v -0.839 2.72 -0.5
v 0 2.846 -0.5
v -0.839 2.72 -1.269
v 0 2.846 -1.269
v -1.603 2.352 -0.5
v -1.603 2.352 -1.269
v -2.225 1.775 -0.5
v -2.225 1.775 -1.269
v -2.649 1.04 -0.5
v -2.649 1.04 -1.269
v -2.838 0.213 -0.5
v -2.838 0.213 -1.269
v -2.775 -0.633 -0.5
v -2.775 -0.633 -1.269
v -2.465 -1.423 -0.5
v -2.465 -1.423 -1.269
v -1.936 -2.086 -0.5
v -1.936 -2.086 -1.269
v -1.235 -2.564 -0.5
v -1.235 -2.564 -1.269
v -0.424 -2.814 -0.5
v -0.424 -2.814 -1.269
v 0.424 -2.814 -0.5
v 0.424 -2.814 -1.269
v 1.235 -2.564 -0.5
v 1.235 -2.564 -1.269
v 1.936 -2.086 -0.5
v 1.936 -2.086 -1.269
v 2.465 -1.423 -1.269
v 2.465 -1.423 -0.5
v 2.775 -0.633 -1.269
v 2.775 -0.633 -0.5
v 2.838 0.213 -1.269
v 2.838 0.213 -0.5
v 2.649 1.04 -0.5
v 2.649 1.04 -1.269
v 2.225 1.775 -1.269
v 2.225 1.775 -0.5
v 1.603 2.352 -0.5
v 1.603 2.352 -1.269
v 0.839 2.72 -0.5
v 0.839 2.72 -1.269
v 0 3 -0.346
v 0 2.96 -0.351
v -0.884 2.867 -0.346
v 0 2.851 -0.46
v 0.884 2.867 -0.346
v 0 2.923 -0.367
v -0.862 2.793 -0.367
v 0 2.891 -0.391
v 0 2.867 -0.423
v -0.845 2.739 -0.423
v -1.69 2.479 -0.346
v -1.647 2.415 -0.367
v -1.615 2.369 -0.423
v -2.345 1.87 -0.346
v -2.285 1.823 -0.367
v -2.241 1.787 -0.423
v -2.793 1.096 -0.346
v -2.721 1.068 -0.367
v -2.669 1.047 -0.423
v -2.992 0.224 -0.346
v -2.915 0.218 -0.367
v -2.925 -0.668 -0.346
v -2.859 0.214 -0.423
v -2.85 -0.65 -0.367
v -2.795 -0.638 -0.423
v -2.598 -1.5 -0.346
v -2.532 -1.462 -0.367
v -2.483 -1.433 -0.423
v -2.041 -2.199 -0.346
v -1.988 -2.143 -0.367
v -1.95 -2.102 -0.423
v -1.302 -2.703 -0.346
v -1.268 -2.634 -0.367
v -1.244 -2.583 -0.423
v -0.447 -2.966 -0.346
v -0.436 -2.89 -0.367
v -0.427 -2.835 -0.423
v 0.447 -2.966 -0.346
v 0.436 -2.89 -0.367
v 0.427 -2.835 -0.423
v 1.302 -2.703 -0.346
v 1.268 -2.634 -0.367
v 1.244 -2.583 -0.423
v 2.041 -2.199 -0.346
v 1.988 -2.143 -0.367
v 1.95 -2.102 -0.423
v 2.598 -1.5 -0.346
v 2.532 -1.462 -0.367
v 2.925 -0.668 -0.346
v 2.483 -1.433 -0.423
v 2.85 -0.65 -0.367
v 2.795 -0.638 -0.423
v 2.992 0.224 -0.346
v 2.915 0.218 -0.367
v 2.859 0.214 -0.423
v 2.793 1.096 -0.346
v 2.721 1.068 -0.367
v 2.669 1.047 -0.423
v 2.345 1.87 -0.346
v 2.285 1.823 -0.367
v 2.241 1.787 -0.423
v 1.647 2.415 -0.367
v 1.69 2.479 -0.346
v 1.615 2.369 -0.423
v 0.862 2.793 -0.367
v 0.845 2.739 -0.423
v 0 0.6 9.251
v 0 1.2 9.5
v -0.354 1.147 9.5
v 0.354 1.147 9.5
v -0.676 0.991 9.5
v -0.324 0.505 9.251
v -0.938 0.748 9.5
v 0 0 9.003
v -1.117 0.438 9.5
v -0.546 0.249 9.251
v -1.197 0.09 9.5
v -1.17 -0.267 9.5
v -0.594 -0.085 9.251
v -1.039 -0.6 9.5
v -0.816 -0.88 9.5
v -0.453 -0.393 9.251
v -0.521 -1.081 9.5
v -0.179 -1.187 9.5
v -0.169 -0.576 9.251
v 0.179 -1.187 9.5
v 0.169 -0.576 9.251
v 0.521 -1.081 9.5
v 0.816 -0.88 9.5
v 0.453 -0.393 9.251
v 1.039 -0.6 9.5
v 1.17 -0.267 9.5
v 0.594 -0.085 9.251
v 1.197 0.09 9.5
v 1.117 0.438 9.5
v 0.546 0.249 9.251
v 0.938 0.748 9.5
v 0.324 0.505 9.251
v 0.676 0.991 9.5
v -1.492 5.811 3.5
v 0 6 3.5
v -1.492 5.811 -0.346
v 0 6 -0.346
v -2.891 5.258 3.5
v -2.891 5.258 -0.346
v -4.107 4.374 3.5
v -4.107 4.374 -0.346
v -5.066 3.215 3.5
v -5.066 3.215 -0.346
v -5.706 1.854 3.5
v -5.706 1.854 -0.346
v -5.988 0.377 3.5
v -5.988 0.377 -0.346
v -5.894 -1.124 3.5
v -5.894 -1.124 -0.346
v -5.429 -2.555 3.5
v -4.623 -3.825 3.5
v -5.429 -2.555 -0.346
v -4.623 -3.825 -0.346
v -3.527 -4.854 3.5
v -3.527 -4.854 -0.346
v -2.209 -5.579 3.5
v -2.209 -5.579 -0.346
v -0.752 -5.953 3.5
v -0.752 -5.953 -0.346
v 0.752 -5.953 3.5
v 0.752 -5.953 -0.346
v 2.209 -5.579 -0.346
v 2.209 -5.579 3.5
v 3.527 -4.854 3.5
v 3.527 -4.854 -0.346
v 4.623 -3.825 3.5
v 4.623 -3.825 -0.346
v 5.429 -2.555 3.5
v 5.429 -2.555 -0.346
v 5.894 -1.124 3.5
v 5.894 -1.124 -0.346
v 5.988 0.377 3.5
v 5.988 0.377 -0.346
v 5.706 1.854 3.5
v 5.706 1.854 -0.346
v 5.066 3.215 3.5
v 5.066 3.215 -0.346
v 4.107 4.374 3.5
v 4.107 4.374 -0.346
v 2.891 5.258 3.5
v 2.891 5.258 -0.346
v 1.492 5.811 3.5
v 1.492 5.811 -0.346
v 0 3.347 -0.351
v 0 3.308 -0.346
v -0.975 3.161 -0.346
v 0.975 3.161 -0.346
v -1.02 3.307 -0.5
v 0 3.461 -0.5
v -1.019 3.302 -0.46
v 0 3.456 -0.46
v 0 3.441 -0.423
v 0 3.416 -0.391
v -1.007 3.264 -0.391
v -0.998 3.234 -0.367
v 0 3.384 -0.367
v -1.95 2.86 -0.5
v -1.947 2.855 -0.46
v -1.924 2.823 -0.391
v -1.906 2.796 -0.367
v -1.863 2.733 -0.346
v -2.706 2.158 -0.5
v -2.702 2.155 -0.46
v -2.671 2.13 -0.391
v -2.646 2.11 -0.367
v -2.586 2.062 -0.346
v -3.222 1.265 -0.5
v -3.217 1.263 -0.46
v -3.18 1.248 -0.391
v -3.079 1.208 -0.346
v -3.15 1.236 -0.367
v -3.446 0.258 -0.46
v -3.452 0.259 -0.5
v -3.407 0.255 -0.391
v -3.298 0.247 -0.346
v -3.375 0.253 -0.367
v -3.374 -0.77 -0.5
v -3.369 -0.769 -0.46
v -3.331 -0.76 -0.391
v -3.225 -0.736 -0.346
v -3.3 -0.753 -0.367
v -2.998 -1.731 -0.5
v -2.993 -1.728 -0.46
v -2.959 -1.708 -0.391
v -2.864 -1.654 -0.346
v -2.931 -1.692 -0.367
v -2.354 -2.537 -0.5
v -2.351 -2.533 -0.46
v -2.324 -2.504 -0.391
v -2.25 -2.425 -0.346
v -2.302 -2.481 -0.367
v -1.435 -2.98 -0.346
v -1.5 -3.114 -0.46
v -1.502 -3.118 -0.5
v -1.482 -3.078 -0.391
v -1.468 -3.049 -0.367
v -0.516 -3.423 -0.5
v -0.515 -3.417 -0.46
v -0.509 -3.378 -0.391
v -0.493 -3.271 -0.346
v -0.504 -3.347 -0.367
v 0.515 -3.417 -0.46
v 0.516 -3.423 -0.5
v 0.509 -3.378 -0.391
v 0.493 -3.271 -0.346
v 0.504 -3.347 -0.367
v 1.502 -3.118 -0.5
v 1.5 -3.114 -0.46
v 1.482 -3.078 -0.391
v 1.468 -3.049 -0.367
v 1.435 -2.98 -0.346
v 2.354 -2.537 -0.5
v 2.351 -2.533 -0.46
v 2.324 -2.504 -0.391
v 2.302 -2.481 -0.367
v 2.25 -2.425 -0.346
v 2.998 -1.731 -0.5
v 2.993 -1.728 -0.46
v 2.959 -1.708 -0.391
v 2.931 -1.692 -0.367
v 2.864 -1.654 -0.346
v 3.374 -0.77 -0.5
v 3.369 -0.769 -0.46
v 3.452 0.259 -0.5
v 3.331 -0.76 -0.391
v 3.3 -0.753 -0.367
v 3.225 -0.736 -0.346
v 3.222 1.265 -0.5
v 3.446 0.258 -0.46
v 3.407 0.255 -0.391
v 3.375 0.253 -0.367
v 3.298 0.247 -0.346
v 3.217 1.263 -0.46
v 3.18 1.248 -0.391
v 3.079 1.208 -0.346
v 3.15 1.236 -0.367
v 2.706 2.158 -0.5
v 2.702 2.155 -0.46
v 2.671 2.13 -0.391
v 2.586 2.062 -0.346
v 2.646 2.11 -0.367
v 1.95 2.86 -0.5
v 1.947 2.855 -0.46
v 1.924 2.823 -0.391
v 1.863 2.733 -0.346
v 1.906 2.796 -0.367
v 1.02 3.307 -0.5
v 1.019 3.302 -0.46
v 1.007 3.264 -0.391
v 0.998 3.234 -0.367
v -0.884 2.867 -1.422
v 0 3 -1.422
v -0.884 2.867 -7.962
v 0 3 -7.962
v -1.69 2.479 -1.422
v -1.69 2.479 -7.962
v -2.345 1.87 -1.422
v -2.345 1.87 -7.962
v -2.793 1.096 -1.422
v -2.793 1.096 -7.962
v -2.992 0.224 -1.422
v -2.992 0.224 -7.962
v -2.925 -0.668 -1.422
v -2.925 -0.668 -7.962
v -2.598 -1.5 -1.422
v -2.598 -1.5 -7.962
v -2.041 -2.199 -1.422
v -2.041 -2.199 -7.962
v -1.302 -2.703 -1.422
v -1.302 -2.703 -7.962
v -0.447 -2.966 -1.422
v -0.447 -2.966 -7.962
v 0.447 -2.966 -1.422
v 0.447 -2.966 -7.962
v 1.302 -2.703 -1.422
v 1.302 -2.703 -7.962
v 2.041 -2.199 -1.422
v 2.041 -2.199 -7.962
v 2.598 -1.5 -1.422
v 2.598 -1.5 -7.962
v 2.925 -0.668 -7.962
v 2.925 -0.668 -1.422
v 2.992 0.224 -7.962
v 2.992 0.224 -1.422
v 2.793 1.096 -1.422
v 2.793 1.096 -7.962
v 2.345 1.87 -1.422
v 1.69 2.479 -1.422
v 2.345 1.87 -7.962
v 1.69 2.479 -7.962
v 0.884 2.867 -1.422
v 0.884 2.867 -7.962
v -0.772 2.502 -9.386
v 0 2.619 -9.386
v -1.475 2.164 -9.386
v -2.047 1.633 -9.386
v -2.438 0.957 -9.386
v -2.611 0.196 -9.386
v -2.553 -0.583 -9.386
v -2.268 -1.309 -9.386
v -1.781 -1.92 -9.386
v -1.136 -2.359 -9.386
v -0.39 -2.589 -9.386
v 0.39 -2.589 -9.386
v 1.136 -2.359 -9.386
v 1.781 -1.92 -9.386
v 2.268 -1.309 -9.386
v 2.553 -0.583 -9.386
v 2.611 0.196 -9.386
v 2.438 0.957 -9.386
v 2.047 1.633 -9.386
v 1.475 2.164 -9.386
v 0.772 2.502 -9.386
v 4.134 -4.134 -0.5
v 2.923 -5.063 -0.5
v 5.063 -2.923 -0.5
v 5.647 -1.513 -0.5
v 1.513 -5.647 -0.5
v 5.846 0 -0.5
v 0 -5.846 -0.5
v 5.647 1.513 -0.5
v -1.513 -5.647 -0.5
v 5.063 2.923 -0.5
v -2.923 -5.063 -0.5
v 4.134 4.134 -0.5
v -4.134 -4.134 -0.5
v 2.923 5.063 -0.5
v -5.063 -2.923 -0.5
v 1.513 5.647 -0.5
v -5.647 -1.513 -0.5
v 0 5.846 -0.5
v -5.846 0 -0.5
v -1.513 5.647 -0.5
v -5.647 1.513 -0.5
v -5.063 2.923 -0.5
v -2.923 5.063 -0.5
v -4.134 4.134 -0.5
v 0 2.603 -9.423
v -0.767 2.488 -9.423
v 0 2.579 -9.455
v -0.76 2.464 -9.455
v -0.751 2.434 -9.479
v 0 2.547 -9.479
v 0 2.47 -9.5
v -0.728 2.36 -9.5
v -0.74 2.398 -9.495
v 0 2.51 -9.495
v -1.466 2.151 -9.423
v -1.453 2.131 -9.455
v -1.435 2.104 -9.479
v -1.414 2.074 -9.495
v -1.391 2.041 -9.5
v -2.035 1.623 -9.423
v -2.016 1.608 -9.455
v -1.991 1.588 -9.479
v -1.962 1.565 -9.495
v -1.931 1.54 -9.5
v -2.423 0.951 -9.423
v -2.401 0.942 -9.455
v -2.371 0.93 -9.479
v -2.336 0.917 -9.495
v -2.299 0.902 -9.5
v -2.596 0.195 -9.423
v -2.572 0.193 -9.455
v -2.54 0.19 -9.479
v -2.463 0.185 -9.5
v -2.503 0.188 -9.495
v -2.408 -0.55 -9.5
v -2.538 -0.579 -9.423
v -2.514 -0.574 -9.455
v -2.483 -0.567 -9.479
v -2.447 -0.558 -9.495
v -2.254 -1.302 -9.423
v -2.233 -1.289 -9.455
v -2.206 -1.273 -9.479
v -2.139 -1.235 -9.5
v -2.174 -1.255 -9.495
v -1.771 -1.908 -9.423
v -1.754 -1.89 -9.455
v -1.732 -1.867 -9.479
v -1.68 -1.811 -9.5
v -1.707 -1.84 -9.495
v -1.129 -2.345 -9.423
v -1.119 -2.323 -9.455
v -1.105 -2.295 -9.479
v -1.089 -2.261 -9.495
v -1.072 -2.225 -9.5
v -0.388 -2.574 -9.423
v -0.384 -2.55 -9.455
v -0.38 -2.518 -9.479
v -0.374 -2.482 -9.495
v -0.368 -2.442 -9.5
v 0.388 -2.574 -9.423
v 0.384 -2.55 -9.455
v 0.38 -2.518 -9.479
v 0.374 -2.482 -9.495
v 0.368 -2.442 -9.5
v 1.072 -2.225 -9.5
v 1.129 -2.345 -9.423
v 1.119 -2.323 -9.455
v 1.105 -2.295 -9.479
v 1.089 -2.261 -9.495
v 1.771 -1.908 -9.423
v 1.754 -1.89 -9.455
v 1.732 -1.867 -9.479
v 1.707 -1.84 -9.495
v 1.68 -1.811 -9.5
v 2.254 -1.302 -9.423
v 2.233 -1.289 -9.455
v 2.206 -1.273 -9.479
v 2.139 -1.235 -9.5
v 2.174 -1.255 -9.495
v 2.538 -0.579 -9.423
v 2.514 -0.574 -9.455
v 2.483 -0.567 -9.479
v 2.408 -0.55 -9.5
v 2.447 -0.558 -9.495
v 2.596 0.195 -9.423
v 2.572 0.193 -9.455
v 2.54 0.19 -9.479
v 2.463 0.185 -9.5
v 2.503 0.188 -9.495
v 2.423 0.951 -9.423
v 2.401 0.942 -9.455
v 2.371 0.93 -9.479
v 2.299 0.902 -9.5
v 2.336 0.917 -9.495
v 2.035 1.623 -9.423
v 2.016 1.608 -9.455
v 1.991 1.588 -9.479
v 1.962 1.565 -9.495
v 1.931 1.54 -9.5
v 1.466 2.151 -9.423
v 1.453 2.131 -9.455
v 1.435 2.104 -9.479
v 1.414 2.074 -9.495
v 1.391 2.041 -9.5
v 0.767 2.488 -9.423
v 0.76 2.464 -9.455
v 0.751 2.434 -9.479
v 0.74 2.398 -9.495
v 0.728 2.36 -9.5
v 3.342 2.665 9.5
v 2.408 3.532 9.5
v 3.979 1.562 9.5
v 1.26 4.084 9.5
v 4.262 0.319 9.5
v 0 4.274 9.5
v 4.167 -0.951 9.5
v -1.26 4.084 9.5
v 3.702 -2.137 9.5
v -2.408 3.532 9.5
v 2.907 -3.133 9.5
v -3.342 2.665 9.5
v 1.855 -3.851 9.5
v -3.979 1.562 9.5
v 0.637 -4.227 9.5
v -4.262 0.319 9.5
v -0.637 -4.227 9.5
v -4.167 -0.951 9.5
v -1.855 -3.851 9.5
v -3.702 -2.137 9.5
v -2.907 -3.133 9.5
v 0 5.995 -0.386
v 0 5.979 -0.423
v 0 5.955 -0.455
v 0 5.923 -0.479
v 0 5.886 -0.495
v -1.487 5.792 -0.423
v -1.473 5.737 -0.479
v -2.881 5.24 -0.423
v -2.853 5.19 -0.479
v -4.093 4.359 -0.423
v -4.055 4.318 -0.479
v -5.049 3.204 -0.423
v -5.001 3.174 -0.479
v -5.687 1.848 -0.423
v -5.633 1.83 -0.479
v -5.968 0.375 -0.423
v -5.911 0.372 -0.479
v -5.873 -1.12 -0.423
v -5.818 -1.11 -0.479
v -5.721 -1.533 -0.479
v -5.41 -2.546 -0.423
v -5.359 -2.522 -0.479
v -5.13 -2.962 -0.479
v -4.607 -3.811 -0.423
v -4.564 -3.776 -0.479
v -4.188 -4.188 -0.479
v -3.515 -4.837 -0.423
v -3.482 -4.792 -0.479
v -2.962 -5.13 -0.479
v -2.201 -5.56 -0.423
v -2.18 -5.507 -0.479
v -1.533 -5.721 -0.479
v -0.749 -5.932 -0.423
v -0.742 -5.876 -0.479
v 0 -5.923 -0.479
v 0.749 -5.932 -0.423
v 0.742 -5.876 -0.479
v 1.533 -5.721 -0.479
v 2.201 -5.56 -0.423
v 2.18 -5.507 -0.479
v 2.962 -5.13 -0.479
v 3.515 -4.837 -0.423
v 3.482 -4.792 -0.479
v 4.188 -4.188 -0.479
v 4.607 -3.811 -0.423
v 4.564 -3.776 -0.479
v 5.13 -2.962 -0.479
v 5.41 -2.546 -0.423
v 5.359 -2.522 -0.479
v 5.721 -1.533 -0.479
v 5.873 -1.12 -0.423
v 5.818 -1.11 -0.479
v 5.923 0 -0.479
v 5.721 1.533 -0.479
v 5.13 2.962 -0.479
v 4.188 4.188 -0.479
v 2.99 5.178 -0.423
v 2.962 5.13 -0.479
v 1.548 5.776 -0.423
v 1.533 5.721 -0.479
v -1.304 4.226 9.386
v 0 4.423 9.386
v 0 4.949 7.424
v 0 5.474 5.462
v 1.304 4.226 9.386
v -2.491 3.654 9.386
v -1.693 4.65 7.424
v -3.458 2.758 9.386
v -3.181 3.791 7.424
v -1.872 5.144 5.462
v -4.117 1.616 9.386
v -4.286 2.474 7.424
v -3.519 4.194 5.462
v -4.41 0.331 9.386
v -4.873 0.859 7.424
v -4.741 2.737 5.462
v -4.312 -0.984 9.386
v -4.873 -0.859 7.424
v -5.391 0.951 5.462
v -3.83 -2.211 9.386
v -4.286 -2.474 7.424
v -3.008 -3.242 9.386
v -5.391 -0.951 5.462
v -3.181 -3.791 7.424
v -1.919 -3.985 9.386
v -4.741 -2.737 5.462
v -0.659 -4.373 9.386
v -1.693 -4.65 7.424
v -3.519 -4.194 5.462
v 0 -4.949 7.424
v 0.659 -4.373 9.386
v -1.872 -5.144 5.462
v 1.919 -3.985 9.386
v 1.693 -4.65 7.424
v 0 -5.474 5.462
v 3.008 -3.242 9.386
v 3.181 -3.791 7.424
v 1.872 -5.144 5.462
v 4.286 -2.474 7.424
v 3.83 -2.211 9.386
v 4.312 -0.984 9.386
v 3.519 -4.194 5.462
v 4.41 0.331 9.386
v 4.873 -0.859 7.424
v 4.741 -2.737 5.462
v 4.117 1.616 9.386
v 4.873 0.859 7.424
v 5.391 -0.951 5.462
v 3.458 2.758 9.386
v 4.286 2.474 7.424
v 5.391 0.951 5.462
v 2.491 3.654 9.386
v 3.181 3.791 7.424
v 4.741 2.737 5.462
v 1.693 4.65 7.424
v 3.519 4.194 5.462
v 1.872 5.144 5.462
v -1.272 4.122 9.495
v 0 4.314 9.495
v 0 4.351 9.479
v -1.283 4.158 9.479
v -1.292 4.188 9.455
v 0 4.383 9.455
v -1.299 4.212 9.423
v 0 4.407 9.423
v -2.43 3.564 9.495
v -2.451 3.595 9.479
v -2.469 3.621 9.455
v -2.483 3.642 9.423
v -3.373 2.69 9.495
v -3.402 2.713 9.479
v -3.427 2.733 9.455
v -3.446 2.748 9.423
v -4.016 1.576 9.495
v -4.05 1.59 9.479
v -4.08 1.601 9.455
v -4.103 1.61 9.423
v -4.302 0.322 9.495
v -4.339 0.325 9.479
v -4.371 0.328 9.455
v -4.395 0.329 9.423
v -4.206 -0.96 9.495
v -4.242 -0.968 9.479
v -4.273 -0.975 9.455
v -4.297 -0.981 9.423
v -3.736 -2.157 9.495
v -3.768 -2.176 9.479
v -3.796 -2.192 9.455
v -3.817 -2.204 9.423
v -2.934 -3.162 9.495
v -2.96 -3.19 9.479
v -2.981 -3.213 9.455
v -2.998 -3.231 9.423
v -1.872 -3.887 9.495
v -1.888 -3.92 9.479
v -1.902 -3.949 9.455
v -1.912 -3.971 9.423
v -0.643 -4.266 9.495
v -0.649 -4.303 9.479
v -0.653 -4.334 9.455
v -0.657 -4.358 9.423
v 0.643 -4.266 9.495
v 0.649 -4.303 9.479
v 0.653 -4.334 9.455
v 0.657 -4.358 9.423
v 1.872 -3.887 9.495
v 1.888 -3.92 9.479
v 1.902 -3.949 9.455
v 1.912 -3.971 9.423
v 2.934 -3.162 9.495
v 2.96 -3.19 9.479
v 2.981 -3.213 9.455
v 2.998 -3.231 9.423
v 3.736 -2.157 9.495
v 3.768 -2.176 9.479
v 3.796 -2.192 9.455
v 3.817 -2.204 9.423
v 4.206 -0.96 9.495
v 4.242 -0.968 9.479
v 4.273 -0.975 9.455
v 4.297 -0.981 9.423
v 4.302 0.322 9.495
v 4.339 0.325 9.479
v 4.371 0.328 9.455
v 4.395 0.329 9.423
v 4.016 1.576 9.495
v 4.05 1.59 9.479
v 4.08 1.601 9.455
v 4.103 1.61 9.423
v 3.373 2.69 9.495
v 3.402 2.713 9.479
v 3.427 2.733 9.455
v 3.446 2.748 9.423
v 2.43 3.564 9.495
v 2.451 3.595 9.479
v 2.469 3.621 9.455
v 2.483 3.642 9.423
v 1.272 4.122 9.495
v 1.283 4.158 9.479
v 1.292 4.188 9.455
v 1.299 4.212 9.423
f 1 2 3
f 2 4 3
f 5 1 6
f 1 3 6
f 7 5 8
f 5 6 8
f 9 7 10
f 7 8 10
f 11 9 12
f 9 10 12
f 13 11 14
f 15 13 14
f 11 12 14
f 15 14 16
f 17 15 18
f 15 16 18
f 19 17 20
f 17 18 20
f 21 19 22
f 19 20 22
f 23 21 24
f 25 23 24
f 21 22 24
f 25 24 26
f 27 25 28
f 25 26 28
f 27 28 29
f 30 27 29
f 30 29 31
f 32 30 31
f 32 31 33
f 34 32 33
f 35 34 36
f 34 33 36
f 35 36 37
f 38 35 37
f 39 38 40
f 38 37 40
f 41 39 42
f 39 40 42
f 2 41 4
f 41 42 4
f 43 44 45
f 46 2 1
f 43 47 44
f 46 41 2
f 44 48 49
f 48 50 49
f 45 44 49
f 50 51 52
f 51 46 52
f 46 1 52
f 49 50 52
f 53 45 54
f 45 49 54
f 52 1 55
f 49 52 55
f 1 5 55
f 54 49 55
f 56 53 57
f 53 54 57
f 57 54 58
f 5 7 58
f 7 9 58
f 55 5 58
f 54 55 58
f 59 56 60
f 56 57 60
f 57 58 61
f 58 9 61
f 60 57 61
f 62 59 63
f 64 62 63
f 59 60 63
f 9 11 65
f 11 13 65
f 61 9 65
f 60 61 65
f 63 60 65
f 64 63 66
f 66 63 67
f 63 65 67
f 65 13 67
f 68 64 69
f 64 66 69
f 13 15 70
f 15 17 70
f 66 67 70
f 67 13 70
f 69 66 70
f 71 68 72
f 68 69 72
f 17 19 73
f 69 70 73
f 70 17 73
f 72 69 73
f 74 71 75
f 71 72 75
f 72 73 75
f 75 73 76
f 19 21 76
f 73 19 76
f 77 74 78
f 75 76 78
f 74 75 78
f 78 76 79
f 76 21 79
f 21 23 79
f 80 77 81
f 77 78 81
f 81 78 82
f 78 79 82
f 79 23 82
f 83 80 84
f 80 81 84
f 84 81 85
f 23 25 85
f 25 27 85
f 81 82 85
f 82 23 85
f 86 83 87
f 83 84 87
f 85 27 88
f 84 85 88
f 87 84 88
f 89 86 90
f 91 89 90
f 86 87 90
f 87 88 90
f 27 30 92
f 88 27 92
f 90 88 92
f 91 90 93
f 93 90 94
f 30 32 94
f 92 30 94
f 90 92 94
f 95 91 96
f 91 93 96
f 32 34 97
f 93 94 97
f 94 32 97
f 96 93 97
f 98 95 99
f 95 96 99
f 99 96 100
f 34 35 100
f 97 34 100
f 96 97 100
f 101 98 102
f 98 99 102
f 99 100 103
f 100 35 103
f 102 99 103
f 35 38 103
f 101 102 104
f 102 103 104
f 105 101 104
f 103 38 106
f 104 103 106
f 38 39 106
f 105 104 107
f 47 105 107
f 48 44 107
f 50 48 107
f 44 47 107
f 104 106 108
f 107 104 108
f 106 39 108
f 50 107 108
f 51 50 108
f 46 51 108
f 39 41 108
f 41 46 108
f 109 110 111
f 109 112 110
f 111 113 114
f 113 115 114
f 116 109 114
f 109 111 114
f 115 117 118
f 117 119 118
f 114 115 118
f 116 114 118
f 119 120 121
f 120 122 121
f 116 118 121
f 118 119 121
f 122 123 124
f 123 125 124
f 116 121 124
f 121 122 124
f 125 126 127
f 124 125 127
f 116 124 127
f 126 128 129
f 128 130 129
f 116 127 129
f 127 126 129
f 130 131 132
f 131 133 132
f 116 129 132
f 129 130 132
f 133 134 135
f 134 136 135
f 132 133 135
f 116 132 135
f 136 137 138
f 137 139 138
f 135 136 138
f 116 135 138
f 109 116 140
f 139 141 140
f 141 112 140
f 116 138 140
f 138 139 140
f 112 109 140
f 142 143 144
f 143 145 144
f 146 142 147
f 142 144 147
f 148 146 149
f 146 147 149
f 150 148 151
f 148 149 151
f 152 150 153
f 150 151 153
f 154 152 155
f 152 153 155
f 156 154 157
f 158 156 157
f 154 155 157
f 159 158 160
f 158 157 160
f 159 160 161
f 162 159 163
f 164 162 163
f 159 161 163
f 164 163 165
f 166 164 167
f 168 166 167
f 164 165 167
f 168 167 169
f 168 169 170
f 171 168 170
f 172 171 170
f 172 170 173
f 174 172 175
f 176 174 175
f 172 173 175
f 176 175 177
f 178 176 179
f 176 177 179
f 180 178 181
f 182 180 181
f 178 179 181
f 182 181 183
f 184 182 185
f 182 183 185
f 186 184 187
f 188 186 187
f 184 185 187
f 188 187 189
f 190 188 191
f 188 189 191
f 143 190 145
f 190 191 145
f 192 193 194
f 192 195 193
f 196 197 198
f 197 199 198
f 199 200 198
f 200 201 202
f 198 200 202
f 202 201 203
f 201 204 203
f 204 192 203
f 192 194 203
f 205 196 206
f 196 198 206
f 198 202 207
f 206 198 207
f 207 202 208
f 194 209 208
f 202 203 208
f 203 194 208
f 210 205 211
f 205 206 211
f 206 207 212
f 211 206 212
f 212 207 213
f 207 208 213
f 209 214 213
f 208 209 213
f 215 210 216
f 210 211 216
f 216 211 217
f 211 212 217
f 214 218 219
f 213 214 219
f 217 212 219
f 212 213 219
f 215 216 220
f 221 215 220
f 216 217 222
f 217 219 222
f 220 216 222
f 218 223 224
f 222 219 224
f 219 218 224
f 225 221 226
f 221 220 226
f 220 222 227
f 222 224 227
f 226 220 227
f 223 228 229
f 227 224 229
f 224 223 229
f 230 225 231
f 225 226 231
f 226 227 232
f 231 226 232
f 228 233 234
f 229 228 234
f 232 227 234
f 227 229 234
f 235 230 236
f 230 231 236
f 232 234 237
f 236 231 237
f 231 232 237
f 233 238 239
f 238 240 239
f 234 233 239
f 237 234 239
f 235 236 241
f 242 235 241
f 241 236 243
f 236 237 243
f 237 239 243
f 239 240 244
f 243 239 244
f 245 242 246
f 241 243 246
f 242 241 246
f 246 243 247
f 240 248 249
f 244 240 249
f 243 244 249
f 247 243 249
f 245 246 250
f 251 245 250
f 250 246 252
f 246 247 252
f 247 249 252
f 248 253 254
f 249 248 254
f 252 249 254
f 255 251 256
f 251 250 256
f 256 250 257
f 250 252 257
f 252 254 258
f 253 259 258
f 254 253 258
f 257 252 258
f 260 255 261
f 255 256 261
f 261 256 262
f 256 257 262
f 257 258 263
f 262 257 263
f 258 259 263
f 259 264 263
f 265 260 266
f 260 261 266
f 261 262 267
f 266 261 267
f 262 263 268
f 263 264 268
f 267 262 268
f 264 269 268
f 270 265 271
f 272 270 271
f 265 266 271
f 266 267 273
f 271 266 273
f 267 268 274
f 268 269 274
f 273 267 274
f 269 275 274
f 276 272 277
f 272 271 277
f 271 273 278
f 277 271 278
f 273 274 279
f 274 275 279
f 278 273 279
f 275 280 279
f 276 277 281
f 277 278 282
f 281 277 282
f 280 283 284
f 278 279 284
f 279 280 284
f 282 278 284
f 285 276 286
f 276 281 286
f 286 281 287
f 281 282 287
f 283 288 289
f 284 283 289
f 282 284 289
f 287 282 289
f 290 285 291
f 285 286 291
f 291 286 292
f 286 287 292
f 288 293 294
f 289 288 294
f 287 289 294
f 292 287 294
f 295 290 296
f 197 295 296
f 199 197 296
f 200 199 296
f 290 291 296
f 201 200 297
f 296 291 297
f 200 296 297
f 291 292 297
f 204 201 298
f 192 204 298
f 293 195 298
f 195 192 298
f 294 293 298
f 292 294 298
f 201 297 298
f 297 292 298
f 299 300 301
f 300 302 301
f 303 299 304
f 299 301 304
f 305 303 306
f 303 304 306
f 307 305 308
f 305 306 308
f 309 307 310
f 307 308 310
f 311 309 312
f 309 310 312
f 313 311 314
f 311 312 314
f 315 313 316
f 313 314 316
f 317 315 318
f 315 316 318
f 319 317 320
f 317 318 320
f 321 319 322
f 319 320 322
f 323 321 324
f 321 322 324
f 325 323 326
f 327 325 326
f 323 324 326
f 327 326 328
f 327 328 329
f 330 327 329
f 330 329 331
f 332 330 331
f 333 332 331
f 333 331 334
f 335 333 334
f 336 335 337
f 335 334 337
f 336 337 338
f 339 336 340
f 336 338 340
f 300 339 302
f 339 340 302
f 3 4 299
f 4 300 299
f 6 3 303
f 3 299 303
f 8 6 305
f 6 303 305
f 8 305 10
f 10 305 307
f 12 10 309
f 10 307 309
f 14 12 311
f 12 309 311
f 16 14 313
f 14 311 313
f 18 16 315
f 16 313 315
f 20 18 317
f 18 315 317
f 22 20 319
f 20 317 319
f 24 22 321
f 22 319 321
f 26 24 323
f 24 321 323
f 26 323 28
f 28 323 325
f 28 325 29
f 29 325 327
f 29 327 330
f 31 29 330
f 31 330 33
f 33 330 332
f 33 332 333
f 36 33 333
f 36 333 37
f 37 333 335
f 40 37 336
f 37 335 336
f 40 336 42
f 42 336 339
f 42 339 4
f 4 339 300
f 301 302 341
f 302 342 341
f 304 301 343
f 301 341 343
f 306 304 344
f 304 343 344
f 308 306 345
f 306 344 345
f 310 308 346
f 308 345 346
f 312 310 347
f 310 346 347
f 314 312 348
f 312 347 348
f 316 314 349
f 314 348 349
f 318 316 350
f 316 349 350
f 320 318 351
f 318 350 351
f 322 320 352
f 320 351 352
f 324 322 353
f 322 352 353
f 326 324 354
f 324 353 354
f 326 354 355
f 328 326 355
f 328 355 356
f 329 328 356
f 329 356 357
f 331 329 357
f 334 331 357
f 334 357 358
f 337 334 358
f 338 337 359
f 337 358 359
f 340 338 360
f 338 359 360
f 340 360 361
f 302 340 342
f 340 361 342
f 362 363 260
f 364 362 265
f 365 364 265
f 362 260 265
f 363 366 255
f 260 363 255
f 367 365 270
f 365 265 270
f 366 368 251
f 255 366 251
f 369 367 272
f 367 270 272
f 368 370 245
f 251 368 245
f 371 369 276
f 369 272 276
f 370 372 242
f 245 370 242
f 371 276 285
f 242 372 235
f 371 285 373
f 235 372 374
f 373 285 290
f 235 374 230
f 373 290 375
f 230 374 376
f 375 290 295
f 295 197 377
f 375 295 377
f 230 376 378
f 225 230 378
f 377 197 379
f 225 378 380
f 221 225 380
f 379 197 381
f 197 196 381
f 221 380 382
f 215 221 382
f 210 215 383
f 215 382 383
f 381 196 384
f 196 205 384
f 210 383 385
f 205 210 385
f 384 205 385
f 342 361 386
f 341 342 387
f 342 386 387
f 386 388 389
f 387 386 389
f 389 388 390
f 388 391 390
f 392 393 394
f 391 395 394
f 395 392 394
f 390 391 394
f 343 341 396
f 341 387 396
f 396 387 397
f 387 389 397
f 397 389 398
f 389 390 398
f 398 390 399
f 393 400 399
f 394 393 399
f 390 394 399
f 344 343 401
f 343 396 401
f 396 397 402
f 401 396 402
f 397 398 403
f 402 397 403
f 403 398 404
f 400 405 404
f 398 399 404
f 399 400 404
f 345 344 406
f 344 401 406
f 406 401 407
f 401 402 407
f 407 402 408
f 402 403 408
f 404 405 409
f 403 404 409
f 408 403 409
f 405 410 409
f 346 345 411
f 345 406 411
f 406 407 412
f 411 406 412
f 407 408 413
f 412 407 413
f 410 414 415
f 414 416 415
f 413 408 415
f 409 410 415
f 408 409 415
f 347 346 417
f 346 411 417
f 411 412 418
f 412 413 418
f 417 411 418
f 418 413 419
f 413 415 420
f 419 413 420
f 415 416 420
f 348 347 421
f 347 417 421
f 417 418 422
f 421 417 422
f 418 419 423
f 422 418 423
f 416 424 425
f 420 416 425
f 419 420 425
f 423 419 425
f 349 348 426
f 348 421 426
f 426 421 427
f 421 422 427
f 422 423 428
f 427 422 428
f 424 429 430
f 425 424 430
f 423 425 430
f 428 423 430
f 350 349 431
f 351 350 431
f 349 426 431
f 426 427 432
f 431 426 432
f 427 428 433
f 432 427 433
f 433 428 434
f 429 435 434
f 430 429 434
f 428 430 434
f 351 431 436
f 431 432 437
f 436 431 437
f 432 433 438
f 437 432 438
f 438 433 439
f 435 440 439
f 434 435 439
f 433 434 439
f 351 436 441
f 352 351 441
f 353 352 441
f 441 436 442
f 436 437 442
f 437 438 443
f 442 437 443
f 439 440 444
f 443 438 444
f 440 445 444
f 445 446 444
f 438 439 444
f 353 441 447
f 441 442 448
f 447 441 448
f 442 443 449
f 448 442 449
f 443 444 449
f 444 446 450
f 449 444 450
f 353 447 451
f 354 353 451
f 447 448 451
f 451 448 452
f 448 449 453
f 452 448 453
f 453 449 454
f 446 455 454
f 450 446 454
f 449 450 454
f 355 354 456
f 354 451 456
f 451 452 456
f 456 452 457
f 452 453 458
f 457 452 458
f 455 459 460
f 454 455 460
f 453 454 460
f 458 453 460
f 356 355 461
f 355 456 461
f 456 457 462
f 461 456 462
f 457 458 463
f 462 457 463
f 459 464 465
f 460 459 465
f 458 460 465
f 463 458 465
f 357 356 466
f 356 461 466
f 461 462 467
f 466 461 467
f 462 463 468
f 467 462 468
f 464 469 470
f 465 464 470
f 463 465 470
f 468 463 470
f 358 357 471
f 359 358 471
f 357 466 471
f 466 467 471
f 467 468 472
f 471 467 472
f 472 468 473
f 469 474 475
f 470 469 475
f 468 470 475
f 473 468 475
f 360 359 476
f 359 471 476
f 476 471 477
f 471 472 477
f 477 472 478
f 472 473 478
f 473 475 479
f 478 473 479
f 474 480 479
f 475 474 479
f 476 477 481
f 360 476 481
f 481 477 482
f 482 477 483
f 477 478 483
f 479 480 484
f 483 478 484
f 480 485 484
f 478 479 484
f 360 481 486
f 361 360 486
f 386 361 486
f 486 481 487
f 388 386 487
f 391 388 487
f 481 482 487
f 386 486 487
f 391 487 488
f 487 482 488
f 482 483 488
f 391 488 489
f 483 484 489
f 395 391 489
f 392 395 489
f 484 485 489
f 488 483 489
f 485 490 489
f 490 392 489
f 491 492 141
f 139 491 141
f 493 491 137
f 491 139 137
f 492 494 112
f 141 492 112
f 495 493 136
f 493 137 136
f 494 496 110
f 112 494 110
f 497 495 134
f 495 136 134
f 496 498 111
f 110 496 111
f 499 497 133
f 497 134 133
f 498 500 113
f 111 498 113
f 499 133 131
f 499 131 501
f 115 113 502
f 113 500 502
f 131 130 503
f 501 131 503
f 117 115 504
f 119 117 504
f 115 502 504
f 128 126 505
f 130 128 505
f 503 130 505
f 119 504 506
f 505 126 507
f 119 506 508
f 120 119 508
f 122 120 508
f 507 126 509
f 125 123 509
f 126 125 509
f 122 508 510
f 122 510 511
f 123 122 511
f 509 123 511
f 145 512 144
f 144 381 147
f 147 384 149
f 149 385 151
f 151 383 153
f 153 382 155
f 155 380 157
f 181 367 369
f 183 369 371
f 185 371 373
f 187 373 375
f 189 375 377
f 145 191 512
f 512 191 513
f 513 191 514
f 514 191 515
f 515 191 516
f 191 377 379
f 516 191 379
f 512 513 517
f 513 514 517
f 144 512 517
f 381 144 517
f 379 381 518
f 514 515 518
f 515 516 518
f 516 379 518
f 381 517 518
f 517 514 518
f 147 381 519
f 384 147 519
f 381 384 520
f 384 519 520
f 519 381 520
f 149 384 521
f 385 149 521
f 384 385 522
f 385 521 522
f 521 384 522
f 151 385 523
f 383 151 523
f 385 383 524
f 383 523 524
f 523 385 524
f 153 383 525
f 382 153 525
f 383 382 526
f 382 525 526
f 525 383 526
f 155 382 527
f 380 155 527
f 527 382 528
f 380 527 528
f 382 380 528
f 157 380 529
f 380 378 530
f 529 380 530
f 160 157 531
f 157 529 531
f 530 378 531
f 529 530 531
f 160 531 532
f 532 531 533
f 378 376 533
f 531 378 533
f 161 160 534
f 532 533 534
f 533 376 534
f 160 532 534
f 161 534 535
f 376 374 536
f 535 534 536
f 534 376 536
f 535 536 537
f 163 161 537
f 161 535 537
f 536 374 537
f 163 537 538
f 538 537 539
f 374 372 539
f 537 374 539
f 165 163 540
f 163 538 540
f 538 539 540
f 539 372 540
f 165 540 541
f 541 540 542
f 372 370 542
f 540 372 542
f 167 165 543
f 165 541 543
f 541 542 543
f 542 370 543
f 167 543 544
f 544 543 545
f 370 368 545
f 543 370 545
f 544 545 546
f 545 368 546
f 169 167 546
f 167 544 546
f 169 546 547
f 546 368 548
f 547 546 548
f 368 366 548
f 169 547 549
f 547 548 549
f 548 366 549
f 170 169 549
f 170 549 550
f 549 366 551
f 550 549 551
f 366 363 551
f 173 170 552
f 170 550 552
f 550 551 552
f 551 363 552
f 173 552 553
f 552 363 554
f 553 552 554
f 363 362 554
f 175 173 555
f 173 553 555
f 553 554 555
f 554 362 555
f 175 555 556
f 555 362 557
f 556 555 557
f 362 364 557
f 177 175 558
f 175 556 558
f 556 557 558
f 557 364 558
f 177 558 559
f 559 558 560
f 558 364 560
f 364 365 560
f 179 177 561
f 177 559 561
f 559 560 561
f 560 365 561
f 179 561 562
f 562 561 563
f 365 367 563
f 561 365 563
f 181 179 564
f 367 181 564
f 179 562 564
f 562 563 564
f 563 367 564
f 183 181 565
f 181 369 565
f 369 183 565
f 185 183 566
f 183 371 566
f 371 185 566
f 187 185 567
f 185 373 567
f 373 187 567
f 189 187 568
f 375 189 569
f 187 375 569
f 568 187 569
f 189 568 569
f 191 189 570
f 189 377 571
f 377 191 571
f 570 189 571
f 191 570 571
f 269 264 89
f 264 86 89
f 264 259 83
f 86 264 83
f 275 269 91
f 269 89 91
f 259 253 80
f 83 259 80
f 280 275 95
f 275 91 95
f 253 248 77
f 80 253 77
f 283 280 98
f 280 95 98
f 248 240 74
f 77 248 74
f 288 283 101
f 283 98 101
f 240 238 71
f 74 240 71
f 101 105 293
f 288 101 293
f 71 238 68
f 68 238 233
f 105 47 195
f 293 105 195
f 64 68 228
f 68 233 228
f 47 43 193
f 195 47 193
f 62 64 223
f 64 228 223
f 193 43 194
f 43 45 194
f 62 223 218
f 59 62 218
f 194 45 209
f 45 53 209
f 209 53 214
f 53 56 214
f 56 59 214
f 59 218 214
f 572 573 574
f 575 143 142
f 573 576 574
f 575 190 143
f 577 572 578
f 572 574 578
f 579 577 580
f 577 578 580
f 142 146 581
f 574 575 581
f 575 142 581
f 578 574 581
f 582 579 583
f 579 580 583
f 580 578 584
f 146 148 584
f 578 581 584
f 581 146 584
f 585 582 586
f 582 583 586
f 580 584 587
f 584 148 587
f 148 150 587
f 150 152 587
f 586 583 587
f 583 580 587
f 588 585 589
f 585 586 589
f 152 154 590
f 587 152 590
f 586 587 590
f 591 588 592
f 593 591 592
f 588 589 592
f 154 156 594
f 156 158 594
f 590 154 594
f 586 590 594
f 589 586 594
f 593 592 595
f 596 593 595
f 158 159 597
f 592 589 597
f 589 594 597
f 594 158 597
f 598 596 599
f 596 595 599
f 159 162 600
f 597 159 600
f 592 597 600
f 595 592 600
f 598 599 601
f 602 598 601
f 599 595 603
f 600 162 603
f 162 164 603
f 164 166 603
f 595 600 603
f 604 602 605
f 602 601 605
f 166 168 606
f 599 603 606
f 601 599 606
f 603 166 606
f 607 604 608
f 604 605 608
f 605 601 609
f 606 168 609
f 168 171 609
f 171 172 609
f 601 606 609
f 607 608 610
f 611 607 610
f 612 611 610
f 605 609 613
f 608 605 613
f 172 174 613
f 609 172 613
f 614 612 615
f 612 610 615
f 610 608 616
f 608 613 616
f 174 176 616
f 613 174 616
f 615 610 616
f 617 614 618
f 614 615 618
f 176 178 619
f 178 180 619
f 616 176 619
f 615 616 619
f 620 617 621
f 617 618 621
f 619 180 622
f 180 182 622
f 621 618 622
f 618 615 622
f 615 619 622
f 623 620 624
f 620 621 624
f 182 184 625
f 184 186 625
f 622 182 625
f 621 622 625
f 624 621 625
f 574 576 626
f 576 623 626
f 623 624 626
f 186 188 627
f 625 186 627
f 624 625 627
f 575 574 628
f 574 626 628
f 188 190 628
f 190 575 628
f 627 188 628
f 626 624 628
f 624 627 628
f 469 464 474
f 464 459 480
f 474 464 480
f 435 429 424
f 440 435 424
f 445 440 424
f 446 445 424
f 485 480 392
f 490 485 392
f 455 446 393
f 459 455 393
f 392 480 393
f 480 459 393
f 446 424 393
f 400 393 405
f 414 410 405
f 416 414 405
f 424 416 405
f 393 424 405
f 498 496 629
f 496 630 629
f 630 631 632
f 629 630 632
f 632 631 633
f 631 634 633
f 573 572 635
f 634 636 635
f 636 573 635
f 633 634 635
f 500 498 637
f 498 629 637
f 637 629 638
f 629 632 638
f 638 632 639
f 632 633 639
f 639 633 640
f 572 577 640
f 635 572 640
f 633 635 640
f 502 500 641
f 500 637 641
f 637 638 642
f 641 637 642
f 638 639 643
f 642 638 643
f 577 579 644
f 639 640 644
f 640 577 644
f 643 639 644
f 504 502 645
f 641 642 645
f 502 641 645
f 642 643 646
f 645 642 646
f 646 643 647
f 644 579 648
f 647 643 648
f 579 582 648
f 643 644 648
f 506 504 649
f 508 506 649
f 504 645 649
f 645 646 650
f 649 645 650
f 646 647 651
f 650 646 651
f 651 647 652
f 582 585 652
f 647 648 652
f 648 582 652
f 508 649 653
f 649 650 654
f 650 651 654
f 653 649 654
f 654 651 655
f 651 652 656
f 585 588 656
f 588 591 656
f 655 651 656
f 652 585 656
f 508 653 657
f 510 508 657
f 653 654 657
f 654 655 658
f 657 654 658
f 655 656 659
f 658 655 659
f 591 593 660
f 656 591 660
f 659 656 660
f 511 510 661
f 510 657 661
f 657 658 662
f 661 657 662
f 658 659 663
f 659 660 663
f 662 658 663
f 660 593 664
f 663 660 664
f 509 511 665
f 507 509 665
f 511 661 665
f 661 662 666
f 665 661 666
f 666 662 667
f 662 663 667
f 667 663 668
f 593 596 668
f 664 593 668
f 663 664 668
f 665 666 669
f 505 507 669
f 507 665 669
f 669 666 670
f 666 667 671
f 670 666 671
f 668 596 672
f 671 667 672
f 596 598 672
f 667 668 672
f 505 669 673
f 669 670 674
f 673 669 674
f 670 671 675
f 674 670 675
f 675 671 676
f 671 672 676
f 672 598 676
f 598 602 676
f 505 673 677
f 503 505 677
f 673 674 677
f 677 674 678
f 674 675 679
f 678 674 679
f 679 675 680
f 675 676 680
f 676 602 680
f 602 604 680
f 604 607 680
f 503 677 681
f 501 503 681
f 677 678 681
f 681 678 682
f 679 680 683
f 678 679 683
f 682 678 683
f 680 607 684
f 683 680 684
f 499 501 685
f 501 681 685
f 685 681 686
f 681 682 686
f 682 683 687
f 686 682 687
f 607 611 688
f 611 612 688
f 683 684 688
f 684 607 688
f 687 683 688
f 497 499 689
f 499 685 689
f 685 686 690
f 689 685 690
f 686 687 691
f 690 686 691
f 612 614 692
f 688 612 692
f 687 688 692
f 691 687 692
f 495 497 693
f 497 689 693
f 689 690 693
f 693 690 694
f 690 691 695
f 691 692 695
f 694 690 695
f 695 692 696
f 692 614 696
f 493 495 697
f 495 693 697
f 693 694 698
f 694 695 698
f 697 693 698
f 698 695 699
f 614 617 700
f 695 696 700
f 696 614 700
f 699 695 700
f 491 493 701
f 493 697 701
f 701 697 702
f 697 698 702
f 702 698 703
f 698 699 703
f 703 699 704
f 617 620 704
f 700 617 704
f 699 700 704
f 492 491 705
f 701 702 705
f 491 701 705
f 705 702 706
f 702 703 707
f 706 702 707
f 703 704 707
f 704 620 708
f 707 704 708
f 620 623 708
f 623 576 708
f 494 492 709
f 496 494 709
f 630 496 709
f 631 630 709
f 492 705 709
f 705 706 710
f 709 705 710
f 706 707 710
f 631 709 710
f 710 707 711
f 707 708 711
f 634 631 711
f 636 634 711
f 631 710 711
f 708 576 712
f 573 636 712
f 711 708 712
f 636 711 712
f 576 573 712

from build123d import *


with BuildPart() as part:
    # Sketch1 → Revolve1 (revolve)
    with BuildSketch(Plane(origin=(0, 0, 0), x_dir=(0, 0, -1), z_dir=(1, 0, 0))):
        with BuildLine():
            Line((-9.5, 1.2), (-9.5, 4.274328321))
            ThreePointArc((-9.5, 4.274328321), (-9.468228076, 4.367925391), (-9.386043428, 4.422839417))
            Line((-9.386043428, 4.422839417), (-3.5, 6))
            Line((-3.5, 6), (0.34625, 6))
            ThreePointArc((0.34625, 6), (0.454967668, 5.954967668), (0.5, 5.84625))
            Line((0.5, 5.84625), (0.5, 3.46125))
            ThreePointArc((0.5, 3.46125), (0.391282332, 3.416217668), (0.34625, 3.3075))
            Line((0.34625, 3.3075), (0.34625, 3))
            ThreePointArc((0.34625, 3), (0.391282332, 2.891282332), (0.5, 2.84625))
            Line((0.5, 2.84625), (1.26875, 2.84625))
            Line((1.26875, 2.84625), (1.4225, 3))
            Line((1.4225, 3), (7.9625, 3))
            Line((7.9625, 3), (9.386043428, 2.618562688))
            ThreePointArc((9.386043428, 2.618562688), (9.468228076, 2.563648662), (9.5, 2.470051592))
            Line((9.5, 2.470051592), (9.5, 0))
            Line((9.5, 0), (-9.002943725, 0))
            Line((-9.002943725, 0), (-9.5, 1.2))
        make_face()
    revolve(axis=Axis((0, 0, -9.5), (0, 0, 1)))


solid = part.part
